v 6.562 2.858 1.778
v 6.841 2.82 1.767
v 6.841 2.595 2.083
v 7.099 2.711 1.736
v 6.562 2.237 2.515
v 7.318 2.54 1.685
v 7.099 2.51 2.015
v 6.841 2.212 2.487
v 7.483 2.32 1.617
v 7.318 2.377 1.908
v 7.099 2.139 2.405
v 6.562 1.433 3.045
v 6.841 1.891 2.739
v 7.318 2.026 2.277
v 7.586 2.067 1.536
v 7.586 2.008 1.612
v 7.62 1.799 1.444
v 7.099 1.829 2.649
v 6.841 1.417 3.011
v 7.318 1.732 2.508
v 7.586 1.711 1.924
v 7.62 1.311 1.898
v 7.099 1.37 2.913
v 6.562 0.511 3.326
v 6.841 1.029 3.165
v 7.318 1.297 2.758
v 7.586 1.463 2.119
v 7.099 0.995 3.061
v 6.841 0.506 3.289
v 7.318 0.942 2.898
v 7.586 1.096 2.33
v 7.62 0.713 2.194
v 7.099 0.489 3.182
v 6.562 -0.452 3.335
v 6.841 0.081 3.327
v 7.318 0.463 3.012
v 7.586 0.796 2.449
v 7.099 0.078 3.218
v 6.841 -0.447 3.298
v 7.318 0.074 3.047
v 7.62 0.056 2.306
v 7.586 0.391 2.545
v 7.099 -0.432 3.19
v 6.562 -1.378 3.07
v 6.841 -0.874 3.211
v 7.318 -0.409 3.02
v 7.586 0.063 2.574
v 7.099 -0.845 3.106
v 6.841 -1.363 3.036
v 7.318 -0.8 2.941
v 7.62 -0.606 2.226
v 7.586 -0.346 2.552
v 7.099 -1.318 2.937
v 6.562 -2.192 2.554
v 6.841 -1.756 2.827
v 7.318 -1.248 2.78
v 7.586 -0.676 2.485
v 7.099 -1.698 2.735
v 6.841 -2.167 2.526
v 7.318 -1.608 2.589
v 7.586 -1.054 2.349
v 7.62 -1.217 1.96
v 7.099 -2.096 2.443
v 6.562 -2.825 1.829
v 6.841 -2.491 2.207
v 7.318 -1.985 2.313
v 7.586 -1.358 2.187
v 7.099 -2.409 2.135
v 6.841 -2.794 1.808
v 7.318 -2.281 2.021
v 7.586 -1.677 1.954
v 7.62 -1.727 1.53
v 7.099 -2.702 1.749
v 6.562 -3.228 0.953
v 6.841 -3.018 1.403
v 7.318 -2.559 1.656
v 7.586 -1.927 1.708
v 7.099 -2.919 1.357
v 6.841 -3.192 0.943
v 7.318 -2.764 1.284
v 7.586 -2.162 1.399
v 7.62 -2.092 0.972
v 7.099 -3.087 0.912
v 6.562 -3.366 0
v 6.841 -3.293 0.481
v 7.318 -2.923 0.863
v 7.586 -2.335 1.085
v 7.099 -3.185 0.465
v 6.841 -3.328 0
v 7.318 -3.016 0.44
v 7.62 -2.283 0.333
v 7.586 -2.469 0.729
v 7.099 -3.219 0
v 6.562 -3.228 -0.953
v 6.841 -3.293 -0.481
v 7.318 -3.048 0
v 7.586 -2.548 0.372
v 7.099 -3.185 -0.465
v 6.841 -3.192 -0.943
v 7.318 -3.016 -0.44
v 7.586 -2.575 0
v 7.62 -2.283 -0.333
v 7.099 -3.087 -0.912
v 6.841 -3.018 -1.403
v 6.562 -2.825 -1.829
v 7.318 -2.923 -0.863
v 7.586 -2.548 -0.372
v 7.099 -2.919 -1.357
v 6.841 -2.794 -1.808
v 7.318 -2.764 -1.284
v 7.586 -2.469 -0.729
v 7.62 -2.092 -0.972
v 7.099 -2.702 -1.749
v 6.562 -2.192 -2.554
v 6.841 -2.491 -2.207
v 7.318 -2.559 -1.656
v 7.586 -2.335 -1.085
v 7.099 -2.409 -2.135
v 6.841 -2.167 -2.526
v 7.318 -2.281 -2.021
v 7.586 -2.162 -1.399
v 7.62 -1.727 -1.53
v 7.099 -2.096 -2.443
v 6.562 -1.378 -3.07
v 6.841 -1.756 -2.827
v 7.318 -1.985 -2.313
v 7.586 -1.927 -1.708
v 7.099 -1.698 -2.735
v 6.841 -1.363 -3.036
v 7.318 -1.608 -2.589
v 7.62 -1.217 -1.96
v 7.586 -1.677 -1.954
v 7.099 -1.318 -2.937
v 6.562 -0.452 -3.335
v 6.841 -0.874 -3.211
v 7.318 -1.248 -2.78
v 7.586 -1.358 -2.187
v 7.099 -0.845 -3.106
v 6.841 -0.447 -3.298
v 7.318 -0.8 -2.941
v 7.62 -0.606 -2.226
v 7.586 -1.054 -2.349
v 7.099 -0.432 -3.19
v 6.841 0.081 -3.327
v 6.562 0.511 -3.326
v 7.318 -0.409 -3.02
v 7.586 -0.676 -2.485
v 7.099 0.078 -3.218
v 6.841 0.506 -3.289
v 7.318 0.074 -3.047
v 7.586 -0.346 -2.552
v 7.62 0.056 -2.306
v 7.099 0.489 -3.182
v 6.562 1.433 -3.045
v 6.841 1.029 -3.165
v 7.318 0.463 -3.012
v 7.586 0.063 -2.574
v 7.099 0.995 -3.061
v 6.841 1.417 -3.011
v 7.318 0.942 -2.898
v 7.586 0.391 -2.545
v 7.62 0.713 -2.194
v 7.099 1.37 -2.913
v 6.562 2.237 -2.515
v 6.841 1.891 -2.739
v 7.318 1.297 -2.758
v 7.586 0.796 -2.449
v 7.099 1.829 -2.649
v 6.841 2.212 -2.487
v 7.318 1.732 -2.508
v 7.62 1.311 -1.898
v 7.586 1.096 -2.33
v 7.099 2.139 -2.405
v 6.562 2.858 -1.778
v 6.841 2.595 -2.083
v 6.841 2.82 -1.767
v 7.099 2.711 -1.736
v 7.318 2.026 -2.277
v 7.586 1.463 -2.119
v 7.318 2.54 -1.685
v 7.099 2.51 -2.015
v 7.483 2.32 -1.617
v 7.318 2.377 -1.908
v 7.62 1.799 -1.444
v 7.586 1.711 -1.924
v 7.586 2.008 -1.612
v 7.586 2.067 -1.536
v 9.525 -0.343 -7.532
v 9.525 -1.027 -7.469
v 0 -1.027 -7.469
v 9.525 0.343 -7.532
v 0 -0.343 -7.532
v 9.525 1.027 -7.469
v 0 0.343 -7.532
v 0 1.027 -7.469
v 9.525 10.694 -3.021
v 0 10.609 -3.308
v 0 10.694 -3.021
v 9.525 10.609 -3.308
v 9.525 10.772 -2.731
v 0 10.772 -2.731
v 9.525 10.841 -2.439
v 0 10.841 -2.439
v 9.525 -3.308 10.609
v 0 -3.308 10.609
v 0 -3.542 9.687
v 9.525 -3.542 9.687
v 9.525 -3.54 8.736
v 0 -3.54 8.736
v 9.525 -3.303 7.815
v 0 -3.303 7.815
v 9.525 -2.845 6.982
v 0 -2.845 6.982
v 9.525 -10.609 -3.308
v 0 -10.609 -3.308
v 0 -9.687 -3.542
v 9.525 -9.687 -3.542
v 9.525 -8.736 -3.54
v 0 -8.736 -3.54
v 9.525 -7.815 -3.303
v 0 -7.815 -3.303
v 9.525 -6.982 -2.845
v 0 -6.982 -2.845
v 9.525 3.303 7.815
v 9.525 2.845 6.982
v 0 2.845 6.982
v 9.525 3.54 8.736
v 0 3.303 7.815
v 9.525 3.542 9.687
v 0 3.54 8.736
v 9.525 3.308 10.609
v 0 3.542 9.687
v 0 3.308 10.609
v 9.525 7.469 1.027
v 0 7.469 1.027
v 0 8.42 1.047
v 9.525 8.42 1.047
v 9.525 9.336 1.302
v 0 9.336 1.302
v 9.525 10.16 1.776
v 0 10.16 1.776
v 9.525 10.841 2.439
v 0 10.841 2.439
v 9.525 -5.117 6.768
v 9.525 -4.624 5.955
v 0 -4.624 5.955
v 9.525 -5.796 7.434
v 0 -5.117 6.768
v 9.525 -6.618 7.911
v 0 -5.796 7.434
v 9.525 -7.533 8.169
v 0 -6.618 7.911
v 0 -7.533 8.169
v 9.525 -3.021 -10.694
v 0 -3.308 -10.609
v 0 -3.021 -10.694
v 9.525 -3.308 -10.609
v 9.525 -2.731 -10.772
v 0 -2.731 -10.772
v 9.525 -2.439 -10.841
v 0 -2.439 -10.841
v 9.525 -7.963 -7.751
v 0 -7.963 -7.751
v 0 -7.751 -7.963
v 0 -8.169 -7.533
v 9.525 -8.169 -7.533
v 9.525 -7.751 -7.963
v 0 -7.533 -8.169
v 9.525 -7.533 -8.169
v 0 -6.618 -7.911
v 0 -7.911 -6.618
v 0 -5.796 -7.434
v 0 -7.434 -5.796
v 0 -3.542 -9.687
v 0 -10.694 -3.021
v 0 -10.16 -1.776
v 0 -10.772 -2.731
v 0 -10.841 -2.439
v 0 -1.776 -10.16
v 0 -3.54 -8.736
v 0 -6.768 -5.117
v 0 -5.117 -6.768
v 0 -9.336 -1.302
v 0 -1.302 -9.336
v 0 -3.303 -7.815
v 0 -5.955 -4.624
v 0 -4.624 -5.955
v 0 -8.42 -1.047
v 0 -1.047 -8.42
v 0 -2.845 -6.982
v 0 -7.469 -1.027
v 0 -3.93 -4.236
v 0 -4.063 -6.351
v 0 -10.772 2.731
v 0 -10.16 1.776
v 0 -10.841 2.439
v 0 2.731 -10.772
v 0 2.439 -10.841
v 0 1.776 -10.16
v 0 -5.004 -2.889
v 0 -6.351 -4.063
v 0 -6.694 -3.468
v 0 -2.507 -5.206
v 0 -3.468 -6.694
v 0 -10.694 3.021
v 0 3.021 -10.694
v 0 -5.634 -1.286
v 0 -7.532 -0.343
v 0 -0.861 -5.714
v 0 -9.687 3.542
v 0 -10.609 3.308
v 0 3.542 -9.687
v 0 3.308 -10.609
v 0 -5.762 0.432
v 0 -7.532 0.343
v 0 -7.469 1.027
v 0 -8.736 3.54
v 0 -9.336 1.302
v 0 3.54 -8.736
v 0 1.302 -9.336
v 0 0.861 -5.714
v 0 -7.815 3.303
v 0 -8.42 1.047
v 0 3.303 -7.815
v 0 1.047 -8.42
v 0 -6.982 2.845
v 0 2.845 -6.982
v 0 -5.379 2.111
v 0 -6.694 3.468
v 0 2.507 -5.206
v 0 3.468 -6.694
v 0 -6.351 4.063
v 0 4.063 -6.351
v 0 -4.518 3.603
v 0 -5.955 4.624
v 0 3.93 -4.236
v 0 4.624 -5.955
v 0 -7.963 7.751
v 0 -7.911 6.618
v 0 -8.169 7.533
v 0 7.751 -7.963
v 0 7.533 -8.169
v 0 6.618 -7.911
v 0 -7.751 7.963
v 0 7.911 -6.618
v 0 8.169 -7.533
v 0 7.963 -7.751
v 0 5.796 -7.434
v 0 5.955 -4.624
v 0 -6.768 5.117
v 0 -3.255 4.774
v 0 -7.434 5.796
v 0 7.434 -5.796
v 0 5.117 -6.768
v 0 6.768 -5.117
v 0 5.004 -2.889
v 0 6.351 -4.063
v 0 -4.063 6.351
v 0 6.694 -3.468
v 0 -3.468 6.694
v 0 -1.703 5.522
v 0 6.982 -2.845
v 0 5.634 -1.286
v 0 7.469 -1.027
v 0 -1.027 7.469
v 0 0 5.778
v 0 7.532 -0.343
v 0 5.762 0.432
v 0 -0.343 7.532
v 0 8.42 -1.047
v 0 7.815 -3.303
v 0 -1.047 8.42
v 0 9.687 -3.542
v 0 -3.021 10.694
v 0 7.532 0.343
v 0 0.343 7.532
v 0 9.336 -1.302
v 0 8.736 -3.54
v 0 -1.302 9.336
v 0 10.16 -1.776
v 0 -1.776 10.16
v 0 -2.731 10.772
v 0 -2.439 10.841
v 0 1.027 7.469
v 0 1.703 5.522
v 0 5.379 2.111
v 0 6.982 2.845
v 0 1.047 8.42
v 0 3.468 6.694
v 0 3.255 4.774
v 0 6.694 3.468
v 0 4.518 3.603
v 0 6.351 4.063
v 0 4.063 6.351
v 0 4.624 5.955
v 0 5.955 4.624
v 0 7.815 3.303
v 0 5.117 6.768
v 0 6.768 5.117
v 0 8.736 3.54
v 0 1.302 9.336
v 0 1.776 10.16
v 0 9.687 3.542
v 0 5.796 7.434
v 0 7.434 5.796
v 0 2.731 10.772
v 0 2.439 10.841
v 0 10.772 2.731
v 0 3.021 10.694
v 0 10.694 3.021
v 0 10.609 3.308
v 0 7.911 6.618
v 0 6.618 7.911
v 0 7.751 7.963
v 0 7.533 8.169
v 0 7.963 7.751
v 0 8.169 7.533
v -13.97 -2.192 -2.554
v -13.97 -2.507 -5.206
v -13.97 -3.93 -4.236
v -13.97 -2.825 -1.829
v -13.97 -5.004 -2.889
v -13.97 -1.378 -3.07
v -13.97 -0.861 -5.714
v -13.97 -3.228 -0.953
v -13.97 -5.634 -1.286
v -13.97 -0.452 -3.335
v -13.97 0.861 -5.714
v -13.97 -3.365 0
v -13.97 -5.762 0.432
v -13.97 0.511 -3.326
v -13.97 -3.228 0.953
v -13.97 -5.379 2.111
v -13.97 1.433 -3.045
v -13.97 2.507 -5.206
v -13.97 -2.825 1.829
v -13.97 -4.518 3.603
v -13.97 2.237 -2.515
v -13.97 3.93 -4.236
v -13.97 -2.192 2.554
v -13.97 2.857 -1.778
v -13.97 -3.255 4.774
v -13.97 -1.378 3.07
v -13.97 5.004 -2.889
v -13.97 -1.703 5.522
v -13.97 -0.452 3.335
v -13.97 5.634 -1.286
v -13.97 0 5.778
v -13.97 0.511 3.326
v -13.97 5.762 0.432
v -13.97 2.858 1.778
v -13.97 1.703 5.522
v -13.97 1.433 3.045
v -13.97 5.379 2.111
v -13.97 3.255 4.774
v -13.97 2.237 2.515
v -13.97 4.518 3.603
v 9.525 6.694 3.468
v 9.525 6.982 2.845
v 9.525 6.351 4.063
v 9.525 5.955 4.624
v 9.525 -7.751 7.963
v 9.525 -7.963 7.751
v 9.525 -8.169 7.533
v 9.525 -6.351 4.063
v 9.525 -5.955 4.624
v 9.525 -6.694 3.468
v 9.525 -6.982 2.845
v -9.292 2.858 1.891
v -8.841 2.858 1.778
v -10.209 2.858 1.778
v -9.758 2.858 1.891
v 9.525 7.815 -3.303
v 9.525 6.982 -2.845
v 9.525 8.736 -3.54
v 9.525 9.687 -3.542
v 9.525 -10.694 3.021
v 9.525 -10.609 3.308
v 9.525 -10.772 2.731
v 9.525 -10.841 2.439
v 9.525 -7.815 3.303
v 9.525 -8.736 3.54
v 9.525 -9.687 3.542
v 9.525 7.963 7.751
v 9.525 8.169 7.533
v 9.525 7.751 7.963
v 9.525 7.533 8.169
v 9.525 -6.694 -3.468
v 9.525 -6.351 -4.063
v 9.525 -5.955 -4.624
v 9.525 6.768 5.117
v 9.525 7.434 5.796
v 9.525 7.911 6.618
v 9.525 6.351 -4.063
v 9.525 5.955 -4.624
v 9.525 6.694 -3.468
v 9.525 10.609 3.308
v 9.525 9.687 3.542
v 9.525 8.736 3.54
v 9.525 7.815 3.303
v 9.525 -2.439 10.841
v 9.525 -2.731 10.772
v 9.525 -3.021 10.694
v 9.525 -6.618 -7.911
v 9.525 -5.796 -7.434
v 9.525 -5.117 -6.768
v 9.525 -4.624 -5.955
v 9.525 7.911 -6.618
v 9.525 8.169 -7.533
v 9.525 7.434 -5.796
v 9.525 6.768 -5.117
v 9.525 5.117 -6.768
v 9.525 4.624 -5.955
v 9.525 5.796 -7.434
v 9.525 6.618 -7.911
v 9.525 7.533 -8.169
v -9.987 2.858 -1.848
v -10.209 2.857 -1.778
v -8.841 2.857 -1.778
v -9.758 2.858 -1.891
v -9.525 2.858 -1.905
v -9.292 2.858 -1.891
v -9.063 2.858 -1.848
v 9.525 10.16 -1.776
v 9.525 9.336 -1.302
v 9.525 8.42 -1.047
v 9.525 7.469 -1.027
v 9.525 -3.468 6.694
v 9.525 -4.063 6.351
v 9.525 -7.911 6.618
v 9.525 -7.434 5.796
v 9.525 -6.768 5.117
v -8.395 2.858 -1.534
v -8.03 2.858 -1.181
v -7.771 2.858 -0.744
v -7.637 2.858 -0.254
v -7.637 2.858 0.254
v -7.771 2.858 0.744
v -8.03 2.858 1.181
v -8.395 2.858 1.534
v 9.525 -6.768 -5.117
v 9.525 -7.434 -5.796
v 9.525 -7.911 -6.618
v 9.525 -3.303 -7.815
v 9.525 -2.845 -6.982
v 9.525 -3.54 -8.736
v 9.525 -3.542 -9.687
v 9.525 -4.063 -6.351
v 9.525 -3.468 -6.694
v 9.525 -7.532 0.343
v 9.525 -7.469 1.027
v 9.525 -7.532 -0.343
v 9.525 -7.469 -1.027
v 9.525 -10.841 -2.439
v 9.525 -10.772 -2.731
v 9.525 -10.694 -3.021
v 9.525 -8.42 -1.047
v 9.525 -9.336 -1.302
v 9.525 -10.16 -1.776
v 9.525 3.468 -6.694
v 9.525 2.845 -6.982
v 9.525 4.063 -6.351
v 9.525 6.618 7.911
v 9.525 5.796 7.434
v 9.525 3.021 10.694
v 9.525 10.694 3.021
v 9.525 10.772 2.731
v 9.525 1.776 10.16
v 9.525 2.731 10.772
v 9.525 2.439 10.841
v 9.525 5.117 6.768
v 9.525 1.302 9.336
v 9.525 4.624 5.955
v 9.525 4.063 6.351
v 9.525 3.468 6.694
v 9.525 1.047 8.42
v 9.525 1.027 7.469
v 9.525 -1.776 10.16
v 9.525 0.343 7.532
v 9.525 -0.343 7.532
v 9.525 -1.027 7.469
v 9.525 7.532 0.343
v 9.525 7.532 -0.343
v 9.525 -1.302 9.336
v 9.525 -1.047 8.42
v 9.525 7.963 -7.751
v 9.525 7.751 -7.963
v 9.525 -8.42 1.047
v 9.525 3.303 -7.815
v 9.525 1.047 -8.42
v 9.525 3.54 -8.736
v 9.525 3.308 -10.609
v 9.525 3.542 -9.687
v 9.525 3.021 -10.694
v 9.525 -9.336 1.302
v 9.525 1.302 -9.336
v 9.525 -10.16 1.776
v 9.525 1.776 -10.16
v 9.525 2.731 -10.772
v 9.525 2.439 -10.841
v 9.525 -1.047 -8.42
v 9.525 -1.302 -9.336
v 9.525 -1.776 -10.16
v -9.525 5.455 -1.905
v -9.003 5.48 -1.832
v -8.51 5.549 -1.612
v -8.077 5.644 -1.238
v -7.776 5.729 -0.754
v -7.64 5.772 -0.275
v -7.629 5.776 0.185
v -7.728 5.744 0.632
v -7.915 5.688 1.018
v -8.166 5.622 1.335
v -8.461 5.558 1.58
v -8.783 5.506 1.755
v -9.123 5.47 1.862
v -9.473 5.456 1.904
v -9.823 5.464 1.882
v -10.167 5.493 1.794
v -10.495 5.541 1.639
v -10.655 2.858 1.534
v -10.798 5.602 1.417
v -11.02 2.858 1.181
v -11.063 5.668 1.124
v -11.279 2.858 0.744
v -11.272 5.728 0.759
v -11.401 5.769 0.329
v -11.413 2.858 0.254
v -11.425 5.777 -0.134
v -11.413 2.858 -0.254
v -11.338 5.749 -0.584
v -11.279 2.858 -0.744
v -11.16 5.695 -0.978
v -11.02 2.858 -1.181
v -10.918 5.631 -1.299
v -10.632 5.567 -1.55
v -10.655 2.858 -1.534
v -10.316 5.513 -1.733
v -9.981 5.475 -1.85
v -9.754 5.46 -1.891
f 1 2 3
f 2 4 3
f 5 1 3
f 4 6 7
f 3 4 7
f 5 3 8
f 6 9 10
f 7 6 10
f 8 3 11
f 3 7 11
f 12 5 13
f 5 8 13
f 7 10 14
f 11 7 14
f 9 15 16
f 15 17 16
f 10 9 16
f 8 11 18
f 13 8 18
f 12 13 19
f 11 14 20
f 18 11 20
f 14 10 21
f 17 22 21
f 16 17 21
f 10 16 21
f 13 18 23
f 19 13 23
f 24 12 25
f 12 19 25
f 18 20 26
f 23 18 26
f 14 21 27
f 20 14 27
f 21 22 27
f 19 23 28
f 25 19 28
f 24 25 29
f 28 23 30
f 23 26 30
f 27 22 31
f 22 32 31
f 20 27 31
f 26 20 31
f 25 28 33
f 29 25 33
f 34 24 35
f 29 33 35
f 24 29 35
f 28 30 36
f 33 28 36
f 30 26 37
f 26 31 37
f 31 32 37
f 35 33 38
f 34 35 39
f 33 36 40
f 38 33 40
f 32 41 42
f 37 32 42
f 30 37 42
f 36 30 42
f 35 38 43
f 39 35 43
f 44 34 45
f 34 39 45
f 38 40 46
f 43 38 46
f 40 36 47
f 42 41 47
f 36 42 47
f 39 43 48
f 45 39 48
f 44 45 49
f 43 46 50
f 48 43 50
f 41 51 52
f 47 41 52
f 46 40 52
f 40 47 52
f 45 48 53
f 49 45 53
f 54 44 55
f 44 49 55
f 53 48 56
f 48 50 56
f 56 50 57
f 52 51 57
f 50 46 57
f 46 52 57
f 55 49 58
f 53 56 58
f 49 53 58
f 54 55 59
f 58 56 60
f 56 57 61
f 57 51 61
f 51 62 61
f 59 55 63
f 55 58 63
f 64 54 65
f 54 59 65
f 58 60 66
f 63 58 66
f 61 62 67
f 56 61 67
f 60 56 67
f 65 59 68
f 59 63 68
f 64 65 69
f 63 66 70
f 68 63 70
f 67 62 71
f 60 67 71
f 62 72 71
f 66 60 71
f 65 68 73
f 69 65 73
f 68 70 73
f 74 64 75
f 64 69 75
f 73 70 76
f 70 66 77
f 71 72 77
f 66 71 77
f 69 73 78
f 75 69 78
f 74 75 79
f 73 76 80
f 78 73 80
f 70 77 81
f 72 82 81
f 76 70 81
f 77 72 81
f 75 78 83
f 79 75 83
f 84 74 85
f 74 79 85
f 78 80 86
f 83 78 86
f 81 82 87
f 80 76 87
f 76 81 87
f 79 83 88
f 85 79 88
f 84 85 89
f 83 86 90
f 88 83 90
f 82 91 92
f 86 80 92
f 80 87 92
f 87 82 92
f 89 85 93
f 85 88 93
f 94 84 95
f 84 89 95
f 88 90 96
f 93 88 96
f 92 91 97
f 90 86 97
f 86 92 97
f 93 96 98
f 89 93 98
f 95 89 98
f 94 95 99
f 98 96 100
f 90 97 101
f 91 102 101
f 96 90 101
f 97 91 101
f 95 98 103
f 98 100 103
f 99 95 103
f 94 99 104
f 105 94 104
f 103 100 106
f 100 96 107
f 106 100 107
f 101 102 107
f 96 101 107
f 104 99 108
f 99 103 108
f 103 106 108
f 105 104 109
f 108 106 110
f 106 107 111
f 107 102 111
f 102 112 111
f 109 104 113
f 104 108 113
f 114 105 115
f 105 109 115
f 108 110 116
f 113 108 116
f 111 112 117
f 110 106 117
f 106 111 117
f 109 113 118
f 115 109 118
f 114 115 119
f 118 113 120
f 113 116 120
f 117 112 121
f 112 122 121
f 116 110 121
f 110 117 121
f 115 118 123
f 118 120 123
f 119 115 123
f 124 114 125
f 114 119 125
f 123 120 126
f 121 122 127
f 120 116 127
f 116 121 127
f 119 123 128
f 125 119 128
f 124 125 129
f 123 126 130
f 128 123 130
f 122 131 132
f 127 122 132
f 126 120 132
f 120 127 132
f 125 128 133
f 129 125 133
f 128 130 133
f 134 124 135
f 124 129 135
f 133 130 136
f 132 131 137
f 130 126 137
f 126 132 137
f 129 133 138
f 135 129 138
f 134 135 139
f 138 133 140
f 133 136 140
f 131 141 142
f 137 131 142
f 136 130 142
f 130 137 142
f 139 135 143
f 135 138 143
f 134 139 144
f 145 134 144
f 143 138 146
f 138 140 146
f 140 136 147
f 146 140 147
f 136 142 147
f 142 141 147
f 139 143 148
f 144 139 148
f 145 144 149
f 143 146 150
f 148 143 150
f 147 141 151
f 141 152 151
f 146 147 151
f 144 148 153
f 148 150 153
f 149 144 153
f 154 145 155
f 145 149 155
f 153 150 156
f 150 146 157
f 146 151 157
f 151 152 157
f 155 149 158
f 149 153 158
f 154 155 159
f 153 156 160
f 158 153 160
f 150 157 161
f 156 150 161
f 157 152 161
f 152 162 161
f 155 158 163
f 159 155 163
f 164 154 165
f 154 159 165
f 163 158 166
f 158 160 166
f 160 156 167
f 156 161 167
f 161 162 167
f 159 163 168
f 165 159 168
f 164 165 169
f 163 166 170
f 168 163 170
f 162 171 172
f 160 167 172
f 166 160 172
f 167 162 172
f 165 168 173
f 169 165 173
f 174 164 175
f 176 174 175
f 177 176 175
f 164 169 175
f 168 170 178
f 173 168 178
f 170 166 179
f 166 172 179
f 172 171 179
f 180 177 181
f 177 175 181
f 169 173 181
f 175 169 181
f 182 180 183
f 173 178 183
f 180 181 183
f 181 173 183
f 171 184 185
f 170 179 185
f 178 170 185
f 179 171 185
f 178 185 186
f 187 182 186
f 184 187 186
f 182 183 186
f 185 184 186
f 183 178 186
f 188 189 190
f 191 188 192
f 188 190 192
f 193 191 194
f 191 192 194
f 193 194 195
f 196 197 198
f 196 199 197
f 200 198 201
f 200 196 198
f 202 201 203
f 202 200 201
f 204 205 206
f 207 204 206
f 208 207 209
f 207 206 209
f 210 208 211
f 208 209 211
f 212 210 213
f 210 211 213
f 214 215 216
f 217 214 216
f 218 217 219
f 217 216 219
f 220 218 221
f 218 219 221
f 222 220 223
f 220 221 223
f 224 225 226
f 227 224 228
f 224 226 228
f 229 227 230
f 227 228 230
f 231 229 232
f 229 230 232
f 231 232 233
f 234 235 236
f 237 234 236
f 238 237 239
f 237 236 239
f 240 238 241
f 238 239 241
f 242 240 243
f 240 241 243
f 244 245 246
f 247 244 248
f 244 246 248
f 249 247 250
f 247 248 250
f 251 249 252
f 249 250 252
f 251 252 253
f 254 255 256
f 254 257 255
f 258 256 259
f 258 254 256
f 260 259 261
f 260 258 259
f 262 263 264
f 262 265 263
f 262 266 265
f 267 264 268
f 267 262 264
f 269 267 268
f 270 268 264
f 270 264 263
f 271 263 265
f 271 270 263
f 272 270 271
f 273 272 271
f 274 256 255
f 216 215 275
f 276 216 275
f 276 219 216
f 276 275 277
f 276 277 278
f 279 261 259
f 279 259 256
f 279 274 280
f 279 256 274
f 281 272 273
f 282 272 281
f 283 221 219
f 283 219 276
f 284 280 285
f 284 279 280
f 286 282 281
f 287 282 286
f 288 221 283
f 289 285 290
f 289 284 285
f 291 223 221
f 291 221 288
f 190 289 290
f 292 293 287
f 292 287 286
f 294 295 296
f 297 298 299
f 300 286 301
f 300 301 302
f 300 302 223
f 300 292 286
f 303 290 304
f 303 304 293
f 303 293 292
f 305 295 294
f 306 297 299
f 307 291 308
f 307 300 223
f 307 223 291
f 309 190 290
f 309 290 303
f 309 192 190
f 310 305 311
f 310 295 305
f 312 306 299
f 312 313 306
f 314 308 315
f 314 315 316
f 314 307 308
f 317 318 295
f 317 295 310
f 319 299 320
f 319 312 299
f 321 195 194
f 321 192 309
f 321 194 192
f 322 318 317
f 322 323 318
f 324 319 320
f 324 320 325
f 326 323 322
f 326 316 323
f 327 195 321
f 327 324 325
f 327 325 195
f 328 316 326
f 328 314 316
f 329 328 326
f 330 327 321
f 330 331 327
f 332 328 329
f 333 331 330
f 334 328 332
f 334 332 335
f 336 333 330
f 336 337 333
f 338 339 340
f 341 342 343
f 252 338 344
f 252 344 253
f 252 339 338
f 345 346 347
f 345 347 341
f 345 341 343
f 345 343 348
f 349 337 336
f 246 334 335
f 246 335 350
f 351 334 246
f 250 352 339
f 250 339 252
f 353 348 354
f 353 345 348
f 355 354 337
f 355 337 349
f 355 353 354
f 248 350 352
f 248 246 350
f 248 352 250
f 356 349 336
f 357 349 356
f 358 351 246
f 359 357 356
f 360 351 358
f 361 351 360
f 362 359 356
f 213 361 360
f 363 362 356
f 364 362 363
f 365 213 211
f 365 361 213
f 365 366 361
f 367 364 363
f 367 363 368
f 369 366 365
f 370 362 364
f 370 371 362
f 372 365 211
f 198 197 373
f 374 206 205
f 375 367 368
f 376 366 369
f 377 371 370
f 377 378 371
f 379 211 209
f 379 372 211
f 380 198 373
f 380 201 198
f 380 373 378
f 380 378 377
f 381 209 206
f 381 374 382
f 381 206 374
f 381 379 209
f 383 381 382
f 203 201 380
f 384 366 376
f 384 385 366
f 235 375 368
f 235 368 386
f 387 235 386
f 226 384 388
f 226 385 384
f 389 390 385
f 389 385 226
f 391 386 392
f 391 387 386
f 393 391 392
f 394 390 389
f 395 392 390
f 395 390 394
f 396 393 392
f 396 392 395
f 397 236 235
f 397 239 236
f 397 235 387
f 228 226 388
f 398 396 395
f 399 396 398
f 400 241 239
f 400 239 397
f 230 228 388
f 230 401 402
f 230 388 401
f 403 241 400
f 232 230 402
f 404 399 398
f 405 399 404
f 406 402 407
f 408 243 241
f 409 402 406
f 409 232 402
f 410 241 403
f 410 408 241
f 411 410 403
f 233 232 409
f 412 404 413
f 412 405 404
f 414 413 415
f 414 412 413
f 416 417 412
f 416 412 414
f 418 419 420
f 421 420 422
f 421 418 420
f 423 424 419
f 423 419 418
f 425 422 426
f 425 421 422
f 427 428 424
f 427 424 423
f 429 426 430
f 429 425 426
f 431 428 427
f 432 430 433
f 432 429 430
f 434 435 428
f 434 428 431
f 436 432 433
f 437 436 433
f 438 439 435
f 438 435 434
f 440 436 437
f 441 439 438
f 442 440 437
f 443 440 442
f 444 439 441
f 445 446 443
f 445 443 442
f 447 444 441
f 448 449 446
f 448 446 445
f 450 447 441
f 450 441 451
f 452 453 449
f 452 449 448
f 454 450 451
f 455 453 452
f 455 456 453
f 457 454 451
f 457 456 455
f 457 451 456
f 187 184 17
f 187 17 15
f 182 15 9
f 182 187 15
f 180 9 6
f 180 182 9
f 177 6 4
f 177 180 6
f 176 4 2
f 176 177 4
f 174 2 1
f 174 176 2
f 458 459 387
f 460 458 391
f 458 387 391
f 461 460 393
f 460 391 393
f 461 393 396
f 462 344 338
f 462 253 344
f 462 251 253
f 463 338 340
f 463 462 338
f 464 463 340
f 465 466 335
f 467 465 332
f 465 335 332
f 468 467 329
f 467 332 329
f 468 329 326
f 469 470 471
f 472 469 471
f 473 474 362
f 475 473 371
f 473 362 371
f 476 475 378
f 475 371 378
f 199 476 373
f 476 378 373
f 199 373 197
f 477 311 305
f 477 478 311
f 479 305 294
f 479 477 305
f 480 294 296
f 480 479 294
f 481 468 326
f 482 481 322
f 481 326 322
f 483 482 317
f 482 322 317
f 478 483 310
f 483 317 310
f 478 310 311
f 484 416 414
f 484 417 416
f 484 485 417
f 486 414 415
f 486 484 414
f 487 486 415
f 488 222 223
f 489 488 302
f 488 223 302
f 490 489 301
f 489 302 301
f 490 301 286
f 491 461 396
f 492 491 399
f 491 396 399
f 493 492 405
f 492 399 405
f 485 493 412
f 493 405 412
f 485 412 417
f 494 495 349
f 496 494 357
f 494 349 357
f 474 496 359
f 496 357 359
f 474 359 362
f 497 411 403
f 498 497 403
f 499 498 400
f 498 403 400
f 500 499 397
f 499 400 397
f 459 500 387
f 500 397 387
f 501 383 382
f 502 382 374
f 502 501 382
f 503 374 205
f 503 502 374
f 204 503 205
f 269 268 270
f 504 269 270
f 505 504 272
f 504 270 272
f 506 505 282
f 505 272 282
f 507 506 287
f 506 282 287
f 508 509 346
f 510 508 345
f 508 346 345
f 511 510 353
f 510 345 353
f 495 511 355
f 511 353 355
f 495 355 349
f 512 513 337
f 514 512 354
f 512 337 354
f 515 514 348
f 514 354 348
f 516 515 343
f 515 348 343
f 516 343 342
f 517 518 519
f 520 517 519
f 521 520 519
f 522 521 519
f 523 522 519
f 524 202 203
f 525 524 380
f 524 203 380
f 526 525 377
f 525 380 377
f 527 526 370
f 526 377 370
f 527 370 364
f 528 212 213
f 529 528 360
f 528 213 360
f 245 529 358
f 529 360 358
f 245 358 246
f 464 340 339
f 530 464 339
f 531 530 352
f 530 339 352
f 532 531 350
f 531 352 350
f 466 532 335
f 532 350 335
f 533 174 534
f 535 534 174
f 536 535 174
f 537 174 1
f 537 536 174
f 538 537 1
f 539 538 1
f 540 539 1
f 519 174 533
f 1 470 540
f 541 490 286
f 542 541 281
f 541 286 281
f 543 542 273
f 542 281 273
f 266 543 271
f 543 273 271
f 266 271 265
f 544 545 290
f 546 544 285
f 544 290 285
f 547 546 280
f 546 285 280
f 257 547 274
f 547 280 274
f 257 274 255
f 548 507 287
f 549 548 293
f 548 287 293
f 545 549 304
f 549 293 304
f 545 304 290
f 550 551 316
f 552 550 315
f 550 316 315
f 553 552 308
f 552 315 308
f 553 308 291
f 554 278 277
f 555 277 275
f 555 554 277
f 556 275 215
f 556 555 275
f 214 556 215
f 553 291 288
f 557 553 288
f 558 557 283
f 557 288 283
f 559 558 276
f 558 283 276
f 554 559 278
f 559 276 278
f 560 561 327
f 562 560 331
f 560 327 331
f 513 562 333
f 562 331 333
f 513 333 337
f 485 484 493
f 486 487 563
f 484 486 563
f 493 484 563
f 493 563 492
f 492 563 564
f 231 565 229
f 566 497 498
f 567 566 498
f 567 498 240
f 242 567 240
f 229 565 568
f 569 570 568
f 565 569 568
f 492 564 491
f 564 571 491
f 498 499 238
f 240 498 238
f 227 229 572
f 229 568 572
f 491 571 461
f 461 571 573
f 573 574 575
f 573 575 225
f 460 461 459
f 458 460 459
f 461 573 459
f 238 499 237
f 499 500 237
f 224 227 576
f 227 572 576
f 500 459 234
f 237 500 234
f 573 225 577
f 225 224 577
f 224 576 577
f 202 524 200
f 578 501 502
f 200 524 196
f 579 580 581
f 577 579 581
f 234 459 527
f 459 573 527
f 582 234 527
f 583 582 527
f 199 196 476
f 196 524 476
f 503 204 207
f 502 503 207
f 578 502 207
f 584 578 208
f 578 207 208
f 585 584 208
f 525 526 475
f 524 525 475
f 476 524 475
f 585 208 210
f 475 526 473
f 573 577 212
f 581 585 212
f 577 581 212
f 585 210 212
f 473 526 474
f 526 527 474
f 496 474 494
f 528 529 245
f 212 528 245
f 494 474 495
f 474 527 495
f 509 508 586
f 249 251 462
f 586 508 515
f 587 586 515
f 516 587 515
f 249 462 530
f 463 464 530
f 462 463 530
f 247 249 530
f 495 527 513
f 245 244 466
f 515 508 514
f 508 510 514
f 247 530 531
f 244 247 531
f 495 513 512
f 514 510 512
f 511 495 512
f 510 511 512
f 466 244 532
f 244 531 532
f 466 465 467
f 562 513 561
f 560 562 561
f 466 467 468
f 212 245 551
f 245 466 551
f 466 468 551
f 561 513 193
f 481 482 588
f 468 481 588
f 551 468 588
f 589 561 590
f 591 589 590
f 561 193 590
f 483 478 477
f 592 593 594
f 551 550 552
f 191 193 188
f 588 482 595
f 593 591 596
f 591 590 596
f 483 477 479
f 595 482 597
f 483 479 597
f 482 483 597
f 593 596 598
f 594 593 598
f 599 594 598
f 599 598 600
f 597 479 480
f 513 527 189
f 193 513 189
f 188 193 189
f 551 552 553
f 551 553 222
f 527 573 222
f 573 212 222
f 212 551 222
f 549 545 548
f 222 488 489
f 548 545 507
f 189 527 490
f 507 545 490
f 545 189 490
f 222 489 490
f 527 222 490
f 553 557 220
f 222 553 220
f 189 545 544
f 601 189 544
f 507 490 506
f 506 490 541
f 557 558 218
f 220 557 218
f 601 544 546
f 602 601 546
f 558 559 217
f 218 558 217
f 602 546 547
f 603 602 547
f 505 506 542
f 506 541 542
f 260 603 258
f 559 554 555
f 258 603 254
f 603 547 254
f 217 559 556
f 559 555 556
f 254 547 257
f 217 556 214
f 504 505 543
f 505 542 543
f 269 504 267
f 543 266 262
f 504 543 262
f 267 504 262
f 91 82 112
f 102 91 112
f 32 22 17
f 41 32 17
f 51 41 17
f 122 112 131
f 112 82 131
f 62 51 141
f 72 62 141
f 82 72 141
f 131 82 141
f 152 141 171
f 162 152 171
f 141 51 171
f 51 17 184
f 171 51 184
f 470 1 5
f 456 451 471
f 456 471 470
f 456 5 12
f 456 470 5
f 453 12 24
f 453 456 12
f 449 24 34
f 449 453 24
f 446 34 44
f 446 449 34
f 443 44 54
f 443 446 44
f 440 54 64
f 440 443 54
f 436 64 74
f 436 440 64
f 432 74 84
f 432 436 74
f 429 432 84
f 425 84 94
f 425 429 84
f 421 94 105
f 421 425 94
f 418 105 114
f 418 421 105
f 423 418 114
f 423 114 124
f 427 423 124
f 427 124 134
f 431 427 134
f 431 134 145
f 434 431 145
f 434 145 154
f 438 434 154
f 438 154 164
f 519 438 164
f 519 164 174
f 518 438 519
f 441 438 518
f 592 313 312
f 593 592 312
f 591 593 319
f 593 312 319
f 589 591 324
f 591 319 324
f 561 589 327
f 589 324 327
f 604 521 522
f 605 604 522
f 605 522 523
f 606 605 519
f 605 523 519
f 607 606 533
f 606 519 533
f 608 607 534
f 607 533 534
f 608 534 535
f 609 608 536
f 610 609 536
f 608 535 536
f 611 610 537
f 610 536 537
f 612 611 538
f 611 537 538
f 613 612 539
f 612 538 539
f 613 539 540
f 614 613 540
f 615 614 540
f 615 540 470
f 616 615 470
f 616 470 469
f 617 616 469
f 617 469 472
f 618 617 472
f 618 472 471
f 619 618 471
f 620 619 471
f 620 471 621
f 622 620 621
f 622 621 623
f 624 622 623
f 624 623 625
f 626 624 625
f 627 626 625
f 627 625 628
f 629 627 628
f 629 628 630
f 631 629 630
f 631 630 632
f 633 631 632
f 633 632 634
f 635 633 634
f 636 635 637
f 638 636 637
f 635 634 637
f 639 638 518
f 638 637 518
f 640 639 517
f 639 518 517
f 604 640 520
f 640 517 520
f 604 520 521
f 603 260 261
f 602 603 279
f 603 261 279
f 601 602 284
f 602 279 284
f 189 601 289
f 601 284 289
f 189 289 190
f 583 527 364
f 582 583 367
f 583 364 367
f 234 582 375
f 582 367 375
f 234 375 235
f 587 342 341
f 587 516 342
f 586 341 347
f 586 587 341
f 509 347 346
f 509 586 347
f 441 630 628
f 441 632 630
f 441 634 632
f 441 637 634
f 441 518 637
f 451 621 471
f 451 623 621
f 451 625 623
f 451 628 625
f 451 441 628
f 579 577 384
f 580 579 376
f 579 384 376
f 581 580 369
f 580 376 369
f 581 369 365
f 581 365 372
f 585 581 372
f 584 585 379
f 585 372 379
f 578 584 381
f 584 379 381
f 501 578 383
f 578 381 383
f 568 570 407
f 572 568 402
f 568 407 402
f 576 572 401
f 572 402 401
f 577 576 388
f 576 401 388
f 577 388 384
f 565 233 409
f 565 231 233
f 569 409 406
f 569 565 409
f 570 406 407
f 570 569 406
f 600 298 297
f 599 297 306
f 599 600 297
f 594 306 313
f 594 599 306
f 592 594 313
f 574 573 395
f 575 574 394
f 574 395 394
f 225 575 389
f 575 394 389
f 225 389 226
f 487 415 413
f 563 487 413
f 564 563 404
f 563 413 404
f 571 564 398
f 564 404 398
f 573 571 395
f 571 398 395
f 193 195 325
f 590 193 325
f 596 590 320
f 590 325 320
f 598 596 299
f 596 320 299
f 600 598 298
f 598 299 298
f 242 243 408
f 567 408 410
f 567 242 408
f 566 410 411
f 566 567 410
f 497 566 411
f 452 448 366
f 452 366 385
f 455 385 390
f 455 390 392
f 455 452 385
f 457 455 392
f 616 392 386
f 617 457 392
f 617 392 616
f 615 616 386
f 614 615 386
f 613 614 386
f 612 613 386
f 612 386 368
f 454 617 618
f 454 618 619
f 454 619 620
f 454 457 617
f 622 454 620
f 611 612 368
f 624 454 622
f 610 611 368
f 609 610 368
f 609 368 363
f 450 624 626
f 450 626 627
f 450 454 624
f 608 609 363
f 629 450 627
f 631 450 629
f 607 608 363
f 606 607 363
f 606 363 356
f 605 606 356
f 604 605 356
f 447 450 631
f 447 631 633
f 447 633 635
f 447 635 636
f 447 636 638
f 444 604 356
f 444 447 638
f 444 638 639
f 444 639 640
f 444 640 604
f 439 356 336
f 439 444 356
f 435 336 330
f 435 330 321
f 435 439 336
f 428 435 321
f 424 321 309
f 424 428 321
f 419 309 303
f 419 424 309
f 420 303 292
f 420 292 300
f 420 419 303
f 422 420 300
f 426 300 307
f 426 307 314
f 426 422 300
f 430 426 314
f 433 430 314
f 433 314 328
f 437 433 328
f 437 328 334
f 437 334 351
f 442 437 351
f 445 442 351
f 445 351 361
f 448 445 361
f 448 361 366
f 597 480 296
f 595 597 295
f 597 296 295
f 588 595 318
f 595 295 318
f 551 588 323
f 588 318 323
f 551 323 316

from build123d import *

# Parameters (mm, degrees)
BASPROSKE_W         = 9.525
BASPROSKE_H         = 11.1125
TOOTHCUT_DEPTH      = 19.376641083
TEETHCUTS_COUNT     = 12
BORSKE_R            = 3.175
BORE_DEPTH          = 9.525
BOSS_EXTRUDE1_START = -25.4
SKETCH2_R           = 7.539355
BOSS_EXTRUDE1_DEPTH = 25.4
CUT_EXTRUDE1_DEPTH  = 23.495
SKETCH5_R           = 1.905
CUT_EXTRUDE2_DEPTH  = 24.605363577
SKETCH6_R           = 12.7
SKETCH6_R_2         = 5.7785
CUT_EXTRUDE3_DEPTH  = 15.875
SKETCH7_R           = 5.7785
CUT_EXTRUDE5_DEPTH  = 1.905
FILLET1_R           = 1.058333333


with BuildPart() as part:
    # BasProSke → Base-Revolve (revolve)
    with BuildSketch(Plane(origin=(0, 0, 0), x_dir=(1, 0, 0), z_dir=(0, 1, 0)), mode=Mode.PRIVATE) as base_revolve_sk:
        with Locations((4.7625, 5.55625)):
            Rectangle(BASPROSKE_W, BASPROSKE_H)
    revolve(base_revolve_sk.sketch.rotate(Axis((-10, 0, 0), (1, 0, 0)), 180), axis=Axis((-10, 0, 0), (1, 0, 0)))

    # TooCutSke → ToothCut (cut, through all)
    with BuildSketch(Plane(origin=(0, 0, 0), x_dir=(0, 0, -1), z_dir=(1, 0, 0))):
        with BuildLine():
            ThreePointArc((1.026937745, 7.469087808), (0, 7.539355), (-1.026937745, 7.469087808))
            ThreePointArc((-1.026937745, 7.469087808), (-1.30857978, 9.35080814), (-2.465050847, 10.861691431))
            ThreePointArc((-2.465050847, 10.861691431), (0, 11.1379), (2.465050847, 10.861691431))
            ThreePointArc((2.465050847, 10.861691431), (1.30857978, 9.35080814), (1.026937745, 7.469087808))
        make_face()
    toothcut = extrude(amount=TOOTHCUT_DEPTH, mode=Mode.SUBTRACT)

    # TeethCuts: ToothCut ×12 about axis
    teethcuts_axis = Axis((0, 0, 0), (1, 0, 0))
    for i in range(1, TEETHCUTS_COUNT):
        add(toothcut.rotate(teethcuts_axis, i * 360 / TEETHCUTS_COUNT), mode=Mode.SUBTRACT)

    # BorSke → Bore (cut, symmetric)
    with BuildSketch(Plane(origin=(0, 0, 0), x_dir=(0, 0, -1), z_dir=(1, 0, 0))):
        with Locations(Location((0, 0, 0), (0, 0, 180))):
            Circle(BORSKE_R)
    extrude(amount=BORE_DEPTH, both=True, mode=Mode.SUBTRACT)

    # Sketch2 → Boss-Extrude1 (add)
    with BuildSketch(Plane(origin=(9.525, 0, 0), x_dir=(0, 0, -1), z_dir=(1, 0, 0)).offset(BOSS_EXTRUDE1_START)):
        with Locations(Location((0, 0, 0), (0, 0, 172.171388978))):
            Circle(SKETCH2_R)
    extrude(amount=BOSS_EXTRUDE1_DEPTH)

    # Sketch3 → Cut-Extrude1 (cut)
    with BuildSketch(Plane.ZY.offset(15.875)):
        with BuildLine():
            Line((-1.778, 2.8575), (1.778, 2.8575))
            ThreePointArc((1.778, 2.8575), (0, -3.3655), (-1.778, 2.8575))
        make_face()
    extrude(amount=-CUT_EXTRUDE1_DEPTH, mode=Mode.SUBTRACT)

    # Sketch5 → Cut-Extrude2 (cut, through all)
    with BuildSketch(Plane.XZ.offset(-2.8575)):
        with Locations(Location((-9.525, 0, 0), (0, 0, 270))):
            Circle(SKETCH5_R)
    extrude(amount=-CUT_EXTRUDE2_DEPTH, mode=Mode.SUBTRACT)

    # Sketch6 → Cut-Extrude3 (cut)
    with BuildSketch(Plane.ZY.offset(15.875)):
        Circle(SKETCH6_R)
        Circle(SKETCH6_R_2, mode=Mode.SUBTRACT)
    extrude(amount=-CUT_EXTRUDE3_DEPTH, mode=Mode.SUBTRACT)

    # Sketch7 → Cut-Extrude5 (cut)
    with BuildSketch(Plane.ZY.offset(15.875)):
        Circle(SKETCH7_R)
    extrude(amount=-CUT_EXTRUDE5_DEPTH, mode=Mode.SUBTRACT)

    # Fillet1
    # the kernel refuses this fillet: 1.058333333 mm, written as the material it adds along each edge
    with BuildSketch(Plane(origin=(7.62, 0, 0), x_dir=(0, 0.9999950652018581, 0.0031415874858805883), z_dir=(0, 0.0031415874858805883, -0.9999950652018581))) as fillet1_piece_1:
        with BuildLine():
            CenterArc((3.3655 - FILLET1_R, -FILLET1_R), FILLET1_R, 0, 90)
            Line((3.3655 - FILLET1_R, 0), (3.3655, 0))
            Line((3.3655, 0), (3.3655, -FILLET1_R))
        make_face()
    revolve(axis=Axis((7.62, 0, 0), (1, 0, 0)), revolution_arc=359.64)
    with BuildSketch(Plane(origin=(7.62, 2.8575, -4.423833333), x_dir=(-1, 0, 0), z_dir=(0, 0, 1))) as fillet1_piece_2:
        with BuildLine():
            CenterArc((FILLET1_R, FILLET1_R), FILLET1_R, 180, 90)
            Line((0, FILLET1_R), (0, 0))
            Line((0, 0), (FILLET1_R, 0))
        make_face()
    extrude(amount=8.847666667)


solid = part.part
